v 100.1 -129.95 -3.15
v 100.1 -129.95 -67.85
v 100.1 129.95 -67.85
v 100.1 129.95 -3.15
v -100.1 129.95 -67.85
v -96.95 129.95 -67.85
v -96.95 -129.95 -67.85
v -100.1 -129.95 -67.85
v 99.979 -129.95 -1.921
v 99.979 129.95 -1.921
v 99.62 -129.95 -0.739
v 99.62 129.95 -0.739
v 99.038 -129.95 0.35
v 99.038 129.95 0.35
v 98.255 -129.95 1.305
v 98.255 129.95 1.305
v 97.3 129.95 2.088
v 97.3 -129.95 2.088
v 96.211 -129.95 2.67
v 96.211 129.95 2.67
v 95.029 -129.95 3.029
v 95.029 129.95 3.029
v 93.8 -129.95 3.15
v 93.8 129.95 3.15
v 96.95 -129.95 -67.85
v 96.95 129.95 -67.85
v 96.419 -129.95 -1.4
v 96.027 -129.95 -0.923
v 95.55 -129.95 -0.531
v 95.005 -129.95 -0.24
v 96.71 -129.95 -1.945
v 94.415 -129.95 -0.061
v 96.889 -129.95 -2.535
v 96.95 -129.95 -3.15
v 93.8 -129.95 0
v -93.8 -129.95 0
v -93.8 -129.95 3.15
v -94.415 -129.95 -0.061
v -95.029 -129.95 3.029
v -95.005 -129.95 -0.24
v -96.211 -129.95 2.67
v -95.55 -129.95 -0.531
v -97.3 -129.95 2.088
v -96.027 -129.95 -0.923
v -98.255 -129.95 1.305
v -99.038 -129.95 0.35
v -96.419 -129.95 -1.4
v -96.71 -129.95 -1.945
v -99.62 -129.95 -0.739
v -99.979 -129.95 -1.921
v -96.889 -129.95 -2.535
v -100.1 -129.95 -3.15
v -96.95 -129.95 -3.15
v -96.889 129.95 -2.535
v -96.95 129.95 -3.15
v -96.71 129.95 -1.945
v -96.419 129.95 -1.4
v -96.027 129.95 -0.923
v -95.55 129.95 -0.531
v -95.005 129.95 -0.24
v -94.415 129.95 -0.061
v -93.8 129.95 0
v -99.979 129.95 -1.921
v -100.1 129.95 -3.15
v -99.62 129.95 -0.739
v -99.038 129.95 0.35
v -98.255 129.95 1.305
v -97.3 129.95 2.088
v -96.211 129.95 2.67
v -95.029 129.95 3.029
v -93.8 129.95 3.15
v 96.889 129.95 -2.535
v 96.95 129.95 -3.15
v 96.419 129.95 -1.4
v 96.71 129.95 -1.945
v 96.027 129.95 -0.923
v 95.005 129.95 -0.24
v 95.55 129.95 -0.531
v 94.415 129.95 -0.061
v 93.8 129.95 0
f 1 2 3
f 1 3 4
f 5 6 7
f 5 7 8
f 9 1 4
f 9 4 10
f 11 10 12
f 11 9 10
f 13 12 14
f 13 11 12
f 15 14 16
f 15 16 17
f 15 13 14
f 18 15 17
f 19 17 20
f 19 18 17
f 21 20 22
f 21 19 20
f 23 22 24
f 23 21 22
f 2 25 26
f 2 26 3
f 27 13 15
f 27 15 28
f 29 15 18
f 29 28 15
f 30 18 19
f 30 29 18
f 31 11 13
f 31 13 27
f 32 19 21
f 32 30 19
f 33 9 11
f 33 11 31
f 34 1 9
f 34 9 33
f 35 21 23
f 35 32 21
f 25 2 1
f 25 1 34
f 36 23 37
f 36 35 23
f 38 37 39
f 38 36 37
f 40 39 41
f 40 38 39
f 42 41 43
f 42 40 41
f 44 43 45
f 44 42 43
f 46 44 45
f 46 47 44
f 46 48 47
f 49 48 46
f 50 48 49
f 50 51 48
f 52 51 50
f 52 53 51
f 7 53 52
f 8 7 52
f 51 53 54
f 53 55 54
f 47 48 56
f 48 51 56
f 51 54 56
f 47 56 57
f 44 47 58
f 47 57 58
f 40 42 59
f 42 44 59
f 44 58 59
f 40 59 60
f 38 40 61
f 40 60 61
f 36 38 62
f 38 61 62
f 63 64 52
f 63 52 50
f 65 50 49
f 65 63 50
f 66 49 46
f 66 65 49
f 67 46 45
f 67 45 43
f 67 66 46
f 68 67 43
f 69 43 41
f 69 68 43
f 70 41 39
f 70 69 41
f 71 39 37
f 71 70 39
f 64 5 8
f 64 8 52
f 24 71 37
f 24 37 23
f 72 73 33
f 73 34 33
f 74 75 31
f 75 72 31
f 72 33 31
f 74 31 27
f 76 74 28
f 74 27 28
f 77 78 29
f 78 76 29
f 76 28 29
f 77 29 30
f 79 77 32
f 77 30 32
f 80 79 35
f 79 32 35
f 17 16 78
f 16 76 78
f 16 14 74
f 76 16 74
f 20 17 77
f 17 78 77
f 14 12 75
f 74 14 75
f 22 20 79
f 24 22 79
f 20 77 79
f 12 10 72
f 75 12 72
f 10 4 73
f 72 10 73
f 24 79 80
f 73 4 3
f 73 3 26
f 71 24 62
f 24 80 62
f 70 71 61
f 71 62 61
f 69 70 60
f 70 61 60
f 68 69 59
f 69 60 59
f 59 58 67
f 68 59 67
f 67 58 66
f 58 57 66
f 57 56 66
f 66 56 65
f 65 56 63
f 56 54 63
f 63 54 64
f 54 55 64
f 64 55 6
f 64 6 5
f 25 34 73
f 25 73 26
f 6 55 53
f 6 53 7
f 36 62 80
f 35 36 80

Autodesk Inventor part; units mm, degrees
ref_plane "YZ Plane" through (0, 0, 0) normal (1, 0, 0) x (0, 1, 0)
ref_plane "XZ Plane" through (0, 0, 0) normal (0, 1, 0) x (-1, 0, 0)
ref_plane "XY Plane" through (0, 0, 0) normal (0, 0, 1) x (1, 0, 0)
sketch "Sketch1" plane through (0, 0, 0) normal (0, 0, 1) x (1, 0, 0)
  line L0 (-100.1, -129.95) -> (100.1, -129.95)
  line L1 (100.1, -129.95) -> (100.1, 129.95)
  line L2 (100.1, 129.95) -> (-100.1, 129.95)
  line L3 (-100.1, 129.95) -> (-100.1, -129.95)
  line L4 (-100.1, -129.95) -> (100.1, 129.95) construction
  line L5 (100.1, -129.95) -> (-100.1, 129.95) construction
  point P0 (0, 0)
  dimension "d0" = 200.2
  dimension "d1" = 259.9
extrude "Plate1" add sketch "Sketch1" along normal blind 3.15
sketch "Sketch2" plane through (96.95, -129.95, 3.15) normal (1, 0, 0) x (0, 1, 0)
  line L0 (259.9, 0) -> (0, 0)
  line L1 (0, 0) -> (0, -71)
  line L2 (0, -71) -> (259.9, -71)
  line L3 (259.9, -71) -> (259.9, 0)
edge flange "Flange1" height 71 angle 90 thickness 3.15 bend radius 3.15 thickness toward (1, 0, 0) relief tear relief width 3.15 relief depth 1.575 corner gap 3.15 corner form 0 edges at (100.1, 0, 0) (-100.1, 0, 0) wall of the first edge with corners at (96.95, 129.95, 3.15) (96.95, -129.95, 3.15) (96.95, -129.95, -67.85) (96.95, 129.95, -67.85)
bend "Bend1"
corner "Corner1"
equation "\"d0\" = shield_x"
equation "\"d1\" = shield_z"
equation "\"Thickness\" = shield_t"
equation "\"d3\" = BendReliefWidth"
equation "\"d4\" = BendReliefDepth"
equation "\"d5\" = MinimumRemnant"
equation "\"d6\" = BendRadius"
equation "\"d7\" = shield_y"
equation "\"d9\" = BendRadius"
equation "\"d10\" = CornerReliefSize"
equation "\"d11\" = GapSize"
equation "\"d12\" = JacobiRadiusSize"
equation "\"BendRadius\" = Thickness"
equation "\"BendReliefWidth\" = Thickness"
equation "\"BendReliefDepth\" = 0.5 * Thickness"
equation "\"CornerReliefSize\" = 4 * Thickness"
equation "\"MinimumRemnant\" = 2 * Thickness"
equation "\"TransitionRadius\" = BendRadius"
equation "\"JacobiRadiusSize\" = BendRadius"
equation "\"GapSize\" = Thickness"
equation "\"laserresin\" = 5"
equation "\"st1_thickness\" = 0.91186"
equation "\"st2_thickness\" = 1.5875"
equation "\"al1_thickness\" = 0.79375"
equation "\"al2_thickness\" = 1.5875"
equation "\"bend_factor\" = 2.26205"
equation "\"st1_bend\" = 2.06267"
equation "\"st2_bend\" = 3.591"
equation "\"st3_bend\" = 113.10236"
equation "\"al1_bend\" = 1.7955"
equation "\"al2_bend\" = 3.591"
equation "\"al3_bend\" = 113.10236"
equation "\"acrylic1_thickness\" = 5.88"
equation "\"acrylic2_thickness\" = 3.15"
equation "\"acrylic3_thickness\" = 3.15"
equation "\"corner_small_r\" = 1"
equation "\"corner_big_r\" = 5"
equation "\"linear_bearing_spacing\" = 208"
equation "\"galvo_y_out_offset\" = 27"
equation "\"galvo_y_in_offset\" = 17.5"
equation "\"laser_diameter\" = 13"
equation "\"nema17_x\" = 43"
equation "\"nema17_shaft\" = 24"
equation "\"lmk8uu_x\" = 25"
equation "\"lmk8uu_shaft\" = 15"
equation "\"lmk8uu_z\" = 24"
equation "\"shf8_y\" = 43"
equation "\"acme_nut_d\" = 19.1"
equation "\"acme_nut_upper_d\" = 12.7"
equation "\"handle_spacing\" = 50.8"
equation "\"handle_d\" = 4.7625"
equation "\"handle_hole_d\" = 2.845"
equation "\"handle_projection\" = 20.6375"
equation "\"switch_spacing\" = 19"
equation "\"laser_body_diameter\" = 12"
equation "\"m3_diameter\" = 3"
equation "\"m3_head\" = 6"
equation "\"m4_diameter\" = 4"
equation "\"m5_diameter\" = 5"
equation "\"m5_head\" = 10.3"
equation "\"rivet1_diameter\" = 3.26"
equation "\"rivet2_diameter\" = 3.26"
equation "\"brass_insert_drill\" = 4"
equation "\"m5_brass_insert_drill\" = 6.7"
equation "\"m3_press_nut_drill\" = 4.5"
equation "\"m5_press_nut_drill\" = 6.5"
equation "\"platform_t\" = 1.5875"
equation "\"platform_z\" = 65"
equation "\"platform_fold_x\" = 15"
equation "\"platform_crane_gap\" = 0.1"
equation "\"platform_gap\" = 0.1"
equation "\"platform_upper_y\" = 46.625"
equation "\"crane_t\" = 1.5875"
equation "\"crane_x\" = 233"
equation "\"crane_gap\" = 0.1"
equation "\"tray_t\" = 5.88"
equation "\"tray_to_platform_oversize\" = 0"
equation "\"reservoir_t\" = 0.91186"
equation "\"reservoir_z\" = 35"
equation "\"reservoir_flap_y\" = 20.91186"
equation "\"frame_front_t\" = 0.91186"
equation "\"frame_front_y\" = 56"
equation "\"frame_front_fold\" = 15"
equation "\"frame_gap\" = 0.1"
equation "\"frame_back_t\" = 0.91186"
equation "\"frame_back_x\" = 277.97628"
equation "\"frame_back_y\" = 53.97628"
equation "\"frame_back_z\" = 497.97628"
equation "\"drawer_t\" = 0.91186"
equation "\"drawer_gap\" = 0.1"
equation "\"drawer_reservoir_overlap_x\" = 24.08814"
equation "\"drawer_x\" = 202.02372"
equation "\"drawer_y\" = 73"
equation "\"drawer_seal_y\" = 101"
equation "\"drawer_window_gap\" = 6"
equation "\"foot_t\" = 0.91186"
equation "\"foot_x\" = 198"
equation "\"foot_y\" = 196"
equation "\"laser_holder_t\" = 0.91186"
equation "\"laser_holder_z\" = 75"
equation "\"laser_offset_x\" = 59"
equation "\"laser_offset_y\" = 8.5"
equation "\"subframe_t\" = 0.79375"
equation "\"subframe_x\" = 66"
equation "\"subframe_y\" = 55"
equation "\"shield_t\" = 3.15"
equation "\"shield_x\" = 200.2"
equation "\"shield_y\" = 71"
equation "\"shield_z\" = 259.9"
equation "\"magnet_t\" = 1.6"
equation "\"magnet_w\" = 12.8"
equation "\"d2\" = BendRadius"
equation "\"sae_4_40_diameter\" = 2.845"
properties part number "shield2a"
